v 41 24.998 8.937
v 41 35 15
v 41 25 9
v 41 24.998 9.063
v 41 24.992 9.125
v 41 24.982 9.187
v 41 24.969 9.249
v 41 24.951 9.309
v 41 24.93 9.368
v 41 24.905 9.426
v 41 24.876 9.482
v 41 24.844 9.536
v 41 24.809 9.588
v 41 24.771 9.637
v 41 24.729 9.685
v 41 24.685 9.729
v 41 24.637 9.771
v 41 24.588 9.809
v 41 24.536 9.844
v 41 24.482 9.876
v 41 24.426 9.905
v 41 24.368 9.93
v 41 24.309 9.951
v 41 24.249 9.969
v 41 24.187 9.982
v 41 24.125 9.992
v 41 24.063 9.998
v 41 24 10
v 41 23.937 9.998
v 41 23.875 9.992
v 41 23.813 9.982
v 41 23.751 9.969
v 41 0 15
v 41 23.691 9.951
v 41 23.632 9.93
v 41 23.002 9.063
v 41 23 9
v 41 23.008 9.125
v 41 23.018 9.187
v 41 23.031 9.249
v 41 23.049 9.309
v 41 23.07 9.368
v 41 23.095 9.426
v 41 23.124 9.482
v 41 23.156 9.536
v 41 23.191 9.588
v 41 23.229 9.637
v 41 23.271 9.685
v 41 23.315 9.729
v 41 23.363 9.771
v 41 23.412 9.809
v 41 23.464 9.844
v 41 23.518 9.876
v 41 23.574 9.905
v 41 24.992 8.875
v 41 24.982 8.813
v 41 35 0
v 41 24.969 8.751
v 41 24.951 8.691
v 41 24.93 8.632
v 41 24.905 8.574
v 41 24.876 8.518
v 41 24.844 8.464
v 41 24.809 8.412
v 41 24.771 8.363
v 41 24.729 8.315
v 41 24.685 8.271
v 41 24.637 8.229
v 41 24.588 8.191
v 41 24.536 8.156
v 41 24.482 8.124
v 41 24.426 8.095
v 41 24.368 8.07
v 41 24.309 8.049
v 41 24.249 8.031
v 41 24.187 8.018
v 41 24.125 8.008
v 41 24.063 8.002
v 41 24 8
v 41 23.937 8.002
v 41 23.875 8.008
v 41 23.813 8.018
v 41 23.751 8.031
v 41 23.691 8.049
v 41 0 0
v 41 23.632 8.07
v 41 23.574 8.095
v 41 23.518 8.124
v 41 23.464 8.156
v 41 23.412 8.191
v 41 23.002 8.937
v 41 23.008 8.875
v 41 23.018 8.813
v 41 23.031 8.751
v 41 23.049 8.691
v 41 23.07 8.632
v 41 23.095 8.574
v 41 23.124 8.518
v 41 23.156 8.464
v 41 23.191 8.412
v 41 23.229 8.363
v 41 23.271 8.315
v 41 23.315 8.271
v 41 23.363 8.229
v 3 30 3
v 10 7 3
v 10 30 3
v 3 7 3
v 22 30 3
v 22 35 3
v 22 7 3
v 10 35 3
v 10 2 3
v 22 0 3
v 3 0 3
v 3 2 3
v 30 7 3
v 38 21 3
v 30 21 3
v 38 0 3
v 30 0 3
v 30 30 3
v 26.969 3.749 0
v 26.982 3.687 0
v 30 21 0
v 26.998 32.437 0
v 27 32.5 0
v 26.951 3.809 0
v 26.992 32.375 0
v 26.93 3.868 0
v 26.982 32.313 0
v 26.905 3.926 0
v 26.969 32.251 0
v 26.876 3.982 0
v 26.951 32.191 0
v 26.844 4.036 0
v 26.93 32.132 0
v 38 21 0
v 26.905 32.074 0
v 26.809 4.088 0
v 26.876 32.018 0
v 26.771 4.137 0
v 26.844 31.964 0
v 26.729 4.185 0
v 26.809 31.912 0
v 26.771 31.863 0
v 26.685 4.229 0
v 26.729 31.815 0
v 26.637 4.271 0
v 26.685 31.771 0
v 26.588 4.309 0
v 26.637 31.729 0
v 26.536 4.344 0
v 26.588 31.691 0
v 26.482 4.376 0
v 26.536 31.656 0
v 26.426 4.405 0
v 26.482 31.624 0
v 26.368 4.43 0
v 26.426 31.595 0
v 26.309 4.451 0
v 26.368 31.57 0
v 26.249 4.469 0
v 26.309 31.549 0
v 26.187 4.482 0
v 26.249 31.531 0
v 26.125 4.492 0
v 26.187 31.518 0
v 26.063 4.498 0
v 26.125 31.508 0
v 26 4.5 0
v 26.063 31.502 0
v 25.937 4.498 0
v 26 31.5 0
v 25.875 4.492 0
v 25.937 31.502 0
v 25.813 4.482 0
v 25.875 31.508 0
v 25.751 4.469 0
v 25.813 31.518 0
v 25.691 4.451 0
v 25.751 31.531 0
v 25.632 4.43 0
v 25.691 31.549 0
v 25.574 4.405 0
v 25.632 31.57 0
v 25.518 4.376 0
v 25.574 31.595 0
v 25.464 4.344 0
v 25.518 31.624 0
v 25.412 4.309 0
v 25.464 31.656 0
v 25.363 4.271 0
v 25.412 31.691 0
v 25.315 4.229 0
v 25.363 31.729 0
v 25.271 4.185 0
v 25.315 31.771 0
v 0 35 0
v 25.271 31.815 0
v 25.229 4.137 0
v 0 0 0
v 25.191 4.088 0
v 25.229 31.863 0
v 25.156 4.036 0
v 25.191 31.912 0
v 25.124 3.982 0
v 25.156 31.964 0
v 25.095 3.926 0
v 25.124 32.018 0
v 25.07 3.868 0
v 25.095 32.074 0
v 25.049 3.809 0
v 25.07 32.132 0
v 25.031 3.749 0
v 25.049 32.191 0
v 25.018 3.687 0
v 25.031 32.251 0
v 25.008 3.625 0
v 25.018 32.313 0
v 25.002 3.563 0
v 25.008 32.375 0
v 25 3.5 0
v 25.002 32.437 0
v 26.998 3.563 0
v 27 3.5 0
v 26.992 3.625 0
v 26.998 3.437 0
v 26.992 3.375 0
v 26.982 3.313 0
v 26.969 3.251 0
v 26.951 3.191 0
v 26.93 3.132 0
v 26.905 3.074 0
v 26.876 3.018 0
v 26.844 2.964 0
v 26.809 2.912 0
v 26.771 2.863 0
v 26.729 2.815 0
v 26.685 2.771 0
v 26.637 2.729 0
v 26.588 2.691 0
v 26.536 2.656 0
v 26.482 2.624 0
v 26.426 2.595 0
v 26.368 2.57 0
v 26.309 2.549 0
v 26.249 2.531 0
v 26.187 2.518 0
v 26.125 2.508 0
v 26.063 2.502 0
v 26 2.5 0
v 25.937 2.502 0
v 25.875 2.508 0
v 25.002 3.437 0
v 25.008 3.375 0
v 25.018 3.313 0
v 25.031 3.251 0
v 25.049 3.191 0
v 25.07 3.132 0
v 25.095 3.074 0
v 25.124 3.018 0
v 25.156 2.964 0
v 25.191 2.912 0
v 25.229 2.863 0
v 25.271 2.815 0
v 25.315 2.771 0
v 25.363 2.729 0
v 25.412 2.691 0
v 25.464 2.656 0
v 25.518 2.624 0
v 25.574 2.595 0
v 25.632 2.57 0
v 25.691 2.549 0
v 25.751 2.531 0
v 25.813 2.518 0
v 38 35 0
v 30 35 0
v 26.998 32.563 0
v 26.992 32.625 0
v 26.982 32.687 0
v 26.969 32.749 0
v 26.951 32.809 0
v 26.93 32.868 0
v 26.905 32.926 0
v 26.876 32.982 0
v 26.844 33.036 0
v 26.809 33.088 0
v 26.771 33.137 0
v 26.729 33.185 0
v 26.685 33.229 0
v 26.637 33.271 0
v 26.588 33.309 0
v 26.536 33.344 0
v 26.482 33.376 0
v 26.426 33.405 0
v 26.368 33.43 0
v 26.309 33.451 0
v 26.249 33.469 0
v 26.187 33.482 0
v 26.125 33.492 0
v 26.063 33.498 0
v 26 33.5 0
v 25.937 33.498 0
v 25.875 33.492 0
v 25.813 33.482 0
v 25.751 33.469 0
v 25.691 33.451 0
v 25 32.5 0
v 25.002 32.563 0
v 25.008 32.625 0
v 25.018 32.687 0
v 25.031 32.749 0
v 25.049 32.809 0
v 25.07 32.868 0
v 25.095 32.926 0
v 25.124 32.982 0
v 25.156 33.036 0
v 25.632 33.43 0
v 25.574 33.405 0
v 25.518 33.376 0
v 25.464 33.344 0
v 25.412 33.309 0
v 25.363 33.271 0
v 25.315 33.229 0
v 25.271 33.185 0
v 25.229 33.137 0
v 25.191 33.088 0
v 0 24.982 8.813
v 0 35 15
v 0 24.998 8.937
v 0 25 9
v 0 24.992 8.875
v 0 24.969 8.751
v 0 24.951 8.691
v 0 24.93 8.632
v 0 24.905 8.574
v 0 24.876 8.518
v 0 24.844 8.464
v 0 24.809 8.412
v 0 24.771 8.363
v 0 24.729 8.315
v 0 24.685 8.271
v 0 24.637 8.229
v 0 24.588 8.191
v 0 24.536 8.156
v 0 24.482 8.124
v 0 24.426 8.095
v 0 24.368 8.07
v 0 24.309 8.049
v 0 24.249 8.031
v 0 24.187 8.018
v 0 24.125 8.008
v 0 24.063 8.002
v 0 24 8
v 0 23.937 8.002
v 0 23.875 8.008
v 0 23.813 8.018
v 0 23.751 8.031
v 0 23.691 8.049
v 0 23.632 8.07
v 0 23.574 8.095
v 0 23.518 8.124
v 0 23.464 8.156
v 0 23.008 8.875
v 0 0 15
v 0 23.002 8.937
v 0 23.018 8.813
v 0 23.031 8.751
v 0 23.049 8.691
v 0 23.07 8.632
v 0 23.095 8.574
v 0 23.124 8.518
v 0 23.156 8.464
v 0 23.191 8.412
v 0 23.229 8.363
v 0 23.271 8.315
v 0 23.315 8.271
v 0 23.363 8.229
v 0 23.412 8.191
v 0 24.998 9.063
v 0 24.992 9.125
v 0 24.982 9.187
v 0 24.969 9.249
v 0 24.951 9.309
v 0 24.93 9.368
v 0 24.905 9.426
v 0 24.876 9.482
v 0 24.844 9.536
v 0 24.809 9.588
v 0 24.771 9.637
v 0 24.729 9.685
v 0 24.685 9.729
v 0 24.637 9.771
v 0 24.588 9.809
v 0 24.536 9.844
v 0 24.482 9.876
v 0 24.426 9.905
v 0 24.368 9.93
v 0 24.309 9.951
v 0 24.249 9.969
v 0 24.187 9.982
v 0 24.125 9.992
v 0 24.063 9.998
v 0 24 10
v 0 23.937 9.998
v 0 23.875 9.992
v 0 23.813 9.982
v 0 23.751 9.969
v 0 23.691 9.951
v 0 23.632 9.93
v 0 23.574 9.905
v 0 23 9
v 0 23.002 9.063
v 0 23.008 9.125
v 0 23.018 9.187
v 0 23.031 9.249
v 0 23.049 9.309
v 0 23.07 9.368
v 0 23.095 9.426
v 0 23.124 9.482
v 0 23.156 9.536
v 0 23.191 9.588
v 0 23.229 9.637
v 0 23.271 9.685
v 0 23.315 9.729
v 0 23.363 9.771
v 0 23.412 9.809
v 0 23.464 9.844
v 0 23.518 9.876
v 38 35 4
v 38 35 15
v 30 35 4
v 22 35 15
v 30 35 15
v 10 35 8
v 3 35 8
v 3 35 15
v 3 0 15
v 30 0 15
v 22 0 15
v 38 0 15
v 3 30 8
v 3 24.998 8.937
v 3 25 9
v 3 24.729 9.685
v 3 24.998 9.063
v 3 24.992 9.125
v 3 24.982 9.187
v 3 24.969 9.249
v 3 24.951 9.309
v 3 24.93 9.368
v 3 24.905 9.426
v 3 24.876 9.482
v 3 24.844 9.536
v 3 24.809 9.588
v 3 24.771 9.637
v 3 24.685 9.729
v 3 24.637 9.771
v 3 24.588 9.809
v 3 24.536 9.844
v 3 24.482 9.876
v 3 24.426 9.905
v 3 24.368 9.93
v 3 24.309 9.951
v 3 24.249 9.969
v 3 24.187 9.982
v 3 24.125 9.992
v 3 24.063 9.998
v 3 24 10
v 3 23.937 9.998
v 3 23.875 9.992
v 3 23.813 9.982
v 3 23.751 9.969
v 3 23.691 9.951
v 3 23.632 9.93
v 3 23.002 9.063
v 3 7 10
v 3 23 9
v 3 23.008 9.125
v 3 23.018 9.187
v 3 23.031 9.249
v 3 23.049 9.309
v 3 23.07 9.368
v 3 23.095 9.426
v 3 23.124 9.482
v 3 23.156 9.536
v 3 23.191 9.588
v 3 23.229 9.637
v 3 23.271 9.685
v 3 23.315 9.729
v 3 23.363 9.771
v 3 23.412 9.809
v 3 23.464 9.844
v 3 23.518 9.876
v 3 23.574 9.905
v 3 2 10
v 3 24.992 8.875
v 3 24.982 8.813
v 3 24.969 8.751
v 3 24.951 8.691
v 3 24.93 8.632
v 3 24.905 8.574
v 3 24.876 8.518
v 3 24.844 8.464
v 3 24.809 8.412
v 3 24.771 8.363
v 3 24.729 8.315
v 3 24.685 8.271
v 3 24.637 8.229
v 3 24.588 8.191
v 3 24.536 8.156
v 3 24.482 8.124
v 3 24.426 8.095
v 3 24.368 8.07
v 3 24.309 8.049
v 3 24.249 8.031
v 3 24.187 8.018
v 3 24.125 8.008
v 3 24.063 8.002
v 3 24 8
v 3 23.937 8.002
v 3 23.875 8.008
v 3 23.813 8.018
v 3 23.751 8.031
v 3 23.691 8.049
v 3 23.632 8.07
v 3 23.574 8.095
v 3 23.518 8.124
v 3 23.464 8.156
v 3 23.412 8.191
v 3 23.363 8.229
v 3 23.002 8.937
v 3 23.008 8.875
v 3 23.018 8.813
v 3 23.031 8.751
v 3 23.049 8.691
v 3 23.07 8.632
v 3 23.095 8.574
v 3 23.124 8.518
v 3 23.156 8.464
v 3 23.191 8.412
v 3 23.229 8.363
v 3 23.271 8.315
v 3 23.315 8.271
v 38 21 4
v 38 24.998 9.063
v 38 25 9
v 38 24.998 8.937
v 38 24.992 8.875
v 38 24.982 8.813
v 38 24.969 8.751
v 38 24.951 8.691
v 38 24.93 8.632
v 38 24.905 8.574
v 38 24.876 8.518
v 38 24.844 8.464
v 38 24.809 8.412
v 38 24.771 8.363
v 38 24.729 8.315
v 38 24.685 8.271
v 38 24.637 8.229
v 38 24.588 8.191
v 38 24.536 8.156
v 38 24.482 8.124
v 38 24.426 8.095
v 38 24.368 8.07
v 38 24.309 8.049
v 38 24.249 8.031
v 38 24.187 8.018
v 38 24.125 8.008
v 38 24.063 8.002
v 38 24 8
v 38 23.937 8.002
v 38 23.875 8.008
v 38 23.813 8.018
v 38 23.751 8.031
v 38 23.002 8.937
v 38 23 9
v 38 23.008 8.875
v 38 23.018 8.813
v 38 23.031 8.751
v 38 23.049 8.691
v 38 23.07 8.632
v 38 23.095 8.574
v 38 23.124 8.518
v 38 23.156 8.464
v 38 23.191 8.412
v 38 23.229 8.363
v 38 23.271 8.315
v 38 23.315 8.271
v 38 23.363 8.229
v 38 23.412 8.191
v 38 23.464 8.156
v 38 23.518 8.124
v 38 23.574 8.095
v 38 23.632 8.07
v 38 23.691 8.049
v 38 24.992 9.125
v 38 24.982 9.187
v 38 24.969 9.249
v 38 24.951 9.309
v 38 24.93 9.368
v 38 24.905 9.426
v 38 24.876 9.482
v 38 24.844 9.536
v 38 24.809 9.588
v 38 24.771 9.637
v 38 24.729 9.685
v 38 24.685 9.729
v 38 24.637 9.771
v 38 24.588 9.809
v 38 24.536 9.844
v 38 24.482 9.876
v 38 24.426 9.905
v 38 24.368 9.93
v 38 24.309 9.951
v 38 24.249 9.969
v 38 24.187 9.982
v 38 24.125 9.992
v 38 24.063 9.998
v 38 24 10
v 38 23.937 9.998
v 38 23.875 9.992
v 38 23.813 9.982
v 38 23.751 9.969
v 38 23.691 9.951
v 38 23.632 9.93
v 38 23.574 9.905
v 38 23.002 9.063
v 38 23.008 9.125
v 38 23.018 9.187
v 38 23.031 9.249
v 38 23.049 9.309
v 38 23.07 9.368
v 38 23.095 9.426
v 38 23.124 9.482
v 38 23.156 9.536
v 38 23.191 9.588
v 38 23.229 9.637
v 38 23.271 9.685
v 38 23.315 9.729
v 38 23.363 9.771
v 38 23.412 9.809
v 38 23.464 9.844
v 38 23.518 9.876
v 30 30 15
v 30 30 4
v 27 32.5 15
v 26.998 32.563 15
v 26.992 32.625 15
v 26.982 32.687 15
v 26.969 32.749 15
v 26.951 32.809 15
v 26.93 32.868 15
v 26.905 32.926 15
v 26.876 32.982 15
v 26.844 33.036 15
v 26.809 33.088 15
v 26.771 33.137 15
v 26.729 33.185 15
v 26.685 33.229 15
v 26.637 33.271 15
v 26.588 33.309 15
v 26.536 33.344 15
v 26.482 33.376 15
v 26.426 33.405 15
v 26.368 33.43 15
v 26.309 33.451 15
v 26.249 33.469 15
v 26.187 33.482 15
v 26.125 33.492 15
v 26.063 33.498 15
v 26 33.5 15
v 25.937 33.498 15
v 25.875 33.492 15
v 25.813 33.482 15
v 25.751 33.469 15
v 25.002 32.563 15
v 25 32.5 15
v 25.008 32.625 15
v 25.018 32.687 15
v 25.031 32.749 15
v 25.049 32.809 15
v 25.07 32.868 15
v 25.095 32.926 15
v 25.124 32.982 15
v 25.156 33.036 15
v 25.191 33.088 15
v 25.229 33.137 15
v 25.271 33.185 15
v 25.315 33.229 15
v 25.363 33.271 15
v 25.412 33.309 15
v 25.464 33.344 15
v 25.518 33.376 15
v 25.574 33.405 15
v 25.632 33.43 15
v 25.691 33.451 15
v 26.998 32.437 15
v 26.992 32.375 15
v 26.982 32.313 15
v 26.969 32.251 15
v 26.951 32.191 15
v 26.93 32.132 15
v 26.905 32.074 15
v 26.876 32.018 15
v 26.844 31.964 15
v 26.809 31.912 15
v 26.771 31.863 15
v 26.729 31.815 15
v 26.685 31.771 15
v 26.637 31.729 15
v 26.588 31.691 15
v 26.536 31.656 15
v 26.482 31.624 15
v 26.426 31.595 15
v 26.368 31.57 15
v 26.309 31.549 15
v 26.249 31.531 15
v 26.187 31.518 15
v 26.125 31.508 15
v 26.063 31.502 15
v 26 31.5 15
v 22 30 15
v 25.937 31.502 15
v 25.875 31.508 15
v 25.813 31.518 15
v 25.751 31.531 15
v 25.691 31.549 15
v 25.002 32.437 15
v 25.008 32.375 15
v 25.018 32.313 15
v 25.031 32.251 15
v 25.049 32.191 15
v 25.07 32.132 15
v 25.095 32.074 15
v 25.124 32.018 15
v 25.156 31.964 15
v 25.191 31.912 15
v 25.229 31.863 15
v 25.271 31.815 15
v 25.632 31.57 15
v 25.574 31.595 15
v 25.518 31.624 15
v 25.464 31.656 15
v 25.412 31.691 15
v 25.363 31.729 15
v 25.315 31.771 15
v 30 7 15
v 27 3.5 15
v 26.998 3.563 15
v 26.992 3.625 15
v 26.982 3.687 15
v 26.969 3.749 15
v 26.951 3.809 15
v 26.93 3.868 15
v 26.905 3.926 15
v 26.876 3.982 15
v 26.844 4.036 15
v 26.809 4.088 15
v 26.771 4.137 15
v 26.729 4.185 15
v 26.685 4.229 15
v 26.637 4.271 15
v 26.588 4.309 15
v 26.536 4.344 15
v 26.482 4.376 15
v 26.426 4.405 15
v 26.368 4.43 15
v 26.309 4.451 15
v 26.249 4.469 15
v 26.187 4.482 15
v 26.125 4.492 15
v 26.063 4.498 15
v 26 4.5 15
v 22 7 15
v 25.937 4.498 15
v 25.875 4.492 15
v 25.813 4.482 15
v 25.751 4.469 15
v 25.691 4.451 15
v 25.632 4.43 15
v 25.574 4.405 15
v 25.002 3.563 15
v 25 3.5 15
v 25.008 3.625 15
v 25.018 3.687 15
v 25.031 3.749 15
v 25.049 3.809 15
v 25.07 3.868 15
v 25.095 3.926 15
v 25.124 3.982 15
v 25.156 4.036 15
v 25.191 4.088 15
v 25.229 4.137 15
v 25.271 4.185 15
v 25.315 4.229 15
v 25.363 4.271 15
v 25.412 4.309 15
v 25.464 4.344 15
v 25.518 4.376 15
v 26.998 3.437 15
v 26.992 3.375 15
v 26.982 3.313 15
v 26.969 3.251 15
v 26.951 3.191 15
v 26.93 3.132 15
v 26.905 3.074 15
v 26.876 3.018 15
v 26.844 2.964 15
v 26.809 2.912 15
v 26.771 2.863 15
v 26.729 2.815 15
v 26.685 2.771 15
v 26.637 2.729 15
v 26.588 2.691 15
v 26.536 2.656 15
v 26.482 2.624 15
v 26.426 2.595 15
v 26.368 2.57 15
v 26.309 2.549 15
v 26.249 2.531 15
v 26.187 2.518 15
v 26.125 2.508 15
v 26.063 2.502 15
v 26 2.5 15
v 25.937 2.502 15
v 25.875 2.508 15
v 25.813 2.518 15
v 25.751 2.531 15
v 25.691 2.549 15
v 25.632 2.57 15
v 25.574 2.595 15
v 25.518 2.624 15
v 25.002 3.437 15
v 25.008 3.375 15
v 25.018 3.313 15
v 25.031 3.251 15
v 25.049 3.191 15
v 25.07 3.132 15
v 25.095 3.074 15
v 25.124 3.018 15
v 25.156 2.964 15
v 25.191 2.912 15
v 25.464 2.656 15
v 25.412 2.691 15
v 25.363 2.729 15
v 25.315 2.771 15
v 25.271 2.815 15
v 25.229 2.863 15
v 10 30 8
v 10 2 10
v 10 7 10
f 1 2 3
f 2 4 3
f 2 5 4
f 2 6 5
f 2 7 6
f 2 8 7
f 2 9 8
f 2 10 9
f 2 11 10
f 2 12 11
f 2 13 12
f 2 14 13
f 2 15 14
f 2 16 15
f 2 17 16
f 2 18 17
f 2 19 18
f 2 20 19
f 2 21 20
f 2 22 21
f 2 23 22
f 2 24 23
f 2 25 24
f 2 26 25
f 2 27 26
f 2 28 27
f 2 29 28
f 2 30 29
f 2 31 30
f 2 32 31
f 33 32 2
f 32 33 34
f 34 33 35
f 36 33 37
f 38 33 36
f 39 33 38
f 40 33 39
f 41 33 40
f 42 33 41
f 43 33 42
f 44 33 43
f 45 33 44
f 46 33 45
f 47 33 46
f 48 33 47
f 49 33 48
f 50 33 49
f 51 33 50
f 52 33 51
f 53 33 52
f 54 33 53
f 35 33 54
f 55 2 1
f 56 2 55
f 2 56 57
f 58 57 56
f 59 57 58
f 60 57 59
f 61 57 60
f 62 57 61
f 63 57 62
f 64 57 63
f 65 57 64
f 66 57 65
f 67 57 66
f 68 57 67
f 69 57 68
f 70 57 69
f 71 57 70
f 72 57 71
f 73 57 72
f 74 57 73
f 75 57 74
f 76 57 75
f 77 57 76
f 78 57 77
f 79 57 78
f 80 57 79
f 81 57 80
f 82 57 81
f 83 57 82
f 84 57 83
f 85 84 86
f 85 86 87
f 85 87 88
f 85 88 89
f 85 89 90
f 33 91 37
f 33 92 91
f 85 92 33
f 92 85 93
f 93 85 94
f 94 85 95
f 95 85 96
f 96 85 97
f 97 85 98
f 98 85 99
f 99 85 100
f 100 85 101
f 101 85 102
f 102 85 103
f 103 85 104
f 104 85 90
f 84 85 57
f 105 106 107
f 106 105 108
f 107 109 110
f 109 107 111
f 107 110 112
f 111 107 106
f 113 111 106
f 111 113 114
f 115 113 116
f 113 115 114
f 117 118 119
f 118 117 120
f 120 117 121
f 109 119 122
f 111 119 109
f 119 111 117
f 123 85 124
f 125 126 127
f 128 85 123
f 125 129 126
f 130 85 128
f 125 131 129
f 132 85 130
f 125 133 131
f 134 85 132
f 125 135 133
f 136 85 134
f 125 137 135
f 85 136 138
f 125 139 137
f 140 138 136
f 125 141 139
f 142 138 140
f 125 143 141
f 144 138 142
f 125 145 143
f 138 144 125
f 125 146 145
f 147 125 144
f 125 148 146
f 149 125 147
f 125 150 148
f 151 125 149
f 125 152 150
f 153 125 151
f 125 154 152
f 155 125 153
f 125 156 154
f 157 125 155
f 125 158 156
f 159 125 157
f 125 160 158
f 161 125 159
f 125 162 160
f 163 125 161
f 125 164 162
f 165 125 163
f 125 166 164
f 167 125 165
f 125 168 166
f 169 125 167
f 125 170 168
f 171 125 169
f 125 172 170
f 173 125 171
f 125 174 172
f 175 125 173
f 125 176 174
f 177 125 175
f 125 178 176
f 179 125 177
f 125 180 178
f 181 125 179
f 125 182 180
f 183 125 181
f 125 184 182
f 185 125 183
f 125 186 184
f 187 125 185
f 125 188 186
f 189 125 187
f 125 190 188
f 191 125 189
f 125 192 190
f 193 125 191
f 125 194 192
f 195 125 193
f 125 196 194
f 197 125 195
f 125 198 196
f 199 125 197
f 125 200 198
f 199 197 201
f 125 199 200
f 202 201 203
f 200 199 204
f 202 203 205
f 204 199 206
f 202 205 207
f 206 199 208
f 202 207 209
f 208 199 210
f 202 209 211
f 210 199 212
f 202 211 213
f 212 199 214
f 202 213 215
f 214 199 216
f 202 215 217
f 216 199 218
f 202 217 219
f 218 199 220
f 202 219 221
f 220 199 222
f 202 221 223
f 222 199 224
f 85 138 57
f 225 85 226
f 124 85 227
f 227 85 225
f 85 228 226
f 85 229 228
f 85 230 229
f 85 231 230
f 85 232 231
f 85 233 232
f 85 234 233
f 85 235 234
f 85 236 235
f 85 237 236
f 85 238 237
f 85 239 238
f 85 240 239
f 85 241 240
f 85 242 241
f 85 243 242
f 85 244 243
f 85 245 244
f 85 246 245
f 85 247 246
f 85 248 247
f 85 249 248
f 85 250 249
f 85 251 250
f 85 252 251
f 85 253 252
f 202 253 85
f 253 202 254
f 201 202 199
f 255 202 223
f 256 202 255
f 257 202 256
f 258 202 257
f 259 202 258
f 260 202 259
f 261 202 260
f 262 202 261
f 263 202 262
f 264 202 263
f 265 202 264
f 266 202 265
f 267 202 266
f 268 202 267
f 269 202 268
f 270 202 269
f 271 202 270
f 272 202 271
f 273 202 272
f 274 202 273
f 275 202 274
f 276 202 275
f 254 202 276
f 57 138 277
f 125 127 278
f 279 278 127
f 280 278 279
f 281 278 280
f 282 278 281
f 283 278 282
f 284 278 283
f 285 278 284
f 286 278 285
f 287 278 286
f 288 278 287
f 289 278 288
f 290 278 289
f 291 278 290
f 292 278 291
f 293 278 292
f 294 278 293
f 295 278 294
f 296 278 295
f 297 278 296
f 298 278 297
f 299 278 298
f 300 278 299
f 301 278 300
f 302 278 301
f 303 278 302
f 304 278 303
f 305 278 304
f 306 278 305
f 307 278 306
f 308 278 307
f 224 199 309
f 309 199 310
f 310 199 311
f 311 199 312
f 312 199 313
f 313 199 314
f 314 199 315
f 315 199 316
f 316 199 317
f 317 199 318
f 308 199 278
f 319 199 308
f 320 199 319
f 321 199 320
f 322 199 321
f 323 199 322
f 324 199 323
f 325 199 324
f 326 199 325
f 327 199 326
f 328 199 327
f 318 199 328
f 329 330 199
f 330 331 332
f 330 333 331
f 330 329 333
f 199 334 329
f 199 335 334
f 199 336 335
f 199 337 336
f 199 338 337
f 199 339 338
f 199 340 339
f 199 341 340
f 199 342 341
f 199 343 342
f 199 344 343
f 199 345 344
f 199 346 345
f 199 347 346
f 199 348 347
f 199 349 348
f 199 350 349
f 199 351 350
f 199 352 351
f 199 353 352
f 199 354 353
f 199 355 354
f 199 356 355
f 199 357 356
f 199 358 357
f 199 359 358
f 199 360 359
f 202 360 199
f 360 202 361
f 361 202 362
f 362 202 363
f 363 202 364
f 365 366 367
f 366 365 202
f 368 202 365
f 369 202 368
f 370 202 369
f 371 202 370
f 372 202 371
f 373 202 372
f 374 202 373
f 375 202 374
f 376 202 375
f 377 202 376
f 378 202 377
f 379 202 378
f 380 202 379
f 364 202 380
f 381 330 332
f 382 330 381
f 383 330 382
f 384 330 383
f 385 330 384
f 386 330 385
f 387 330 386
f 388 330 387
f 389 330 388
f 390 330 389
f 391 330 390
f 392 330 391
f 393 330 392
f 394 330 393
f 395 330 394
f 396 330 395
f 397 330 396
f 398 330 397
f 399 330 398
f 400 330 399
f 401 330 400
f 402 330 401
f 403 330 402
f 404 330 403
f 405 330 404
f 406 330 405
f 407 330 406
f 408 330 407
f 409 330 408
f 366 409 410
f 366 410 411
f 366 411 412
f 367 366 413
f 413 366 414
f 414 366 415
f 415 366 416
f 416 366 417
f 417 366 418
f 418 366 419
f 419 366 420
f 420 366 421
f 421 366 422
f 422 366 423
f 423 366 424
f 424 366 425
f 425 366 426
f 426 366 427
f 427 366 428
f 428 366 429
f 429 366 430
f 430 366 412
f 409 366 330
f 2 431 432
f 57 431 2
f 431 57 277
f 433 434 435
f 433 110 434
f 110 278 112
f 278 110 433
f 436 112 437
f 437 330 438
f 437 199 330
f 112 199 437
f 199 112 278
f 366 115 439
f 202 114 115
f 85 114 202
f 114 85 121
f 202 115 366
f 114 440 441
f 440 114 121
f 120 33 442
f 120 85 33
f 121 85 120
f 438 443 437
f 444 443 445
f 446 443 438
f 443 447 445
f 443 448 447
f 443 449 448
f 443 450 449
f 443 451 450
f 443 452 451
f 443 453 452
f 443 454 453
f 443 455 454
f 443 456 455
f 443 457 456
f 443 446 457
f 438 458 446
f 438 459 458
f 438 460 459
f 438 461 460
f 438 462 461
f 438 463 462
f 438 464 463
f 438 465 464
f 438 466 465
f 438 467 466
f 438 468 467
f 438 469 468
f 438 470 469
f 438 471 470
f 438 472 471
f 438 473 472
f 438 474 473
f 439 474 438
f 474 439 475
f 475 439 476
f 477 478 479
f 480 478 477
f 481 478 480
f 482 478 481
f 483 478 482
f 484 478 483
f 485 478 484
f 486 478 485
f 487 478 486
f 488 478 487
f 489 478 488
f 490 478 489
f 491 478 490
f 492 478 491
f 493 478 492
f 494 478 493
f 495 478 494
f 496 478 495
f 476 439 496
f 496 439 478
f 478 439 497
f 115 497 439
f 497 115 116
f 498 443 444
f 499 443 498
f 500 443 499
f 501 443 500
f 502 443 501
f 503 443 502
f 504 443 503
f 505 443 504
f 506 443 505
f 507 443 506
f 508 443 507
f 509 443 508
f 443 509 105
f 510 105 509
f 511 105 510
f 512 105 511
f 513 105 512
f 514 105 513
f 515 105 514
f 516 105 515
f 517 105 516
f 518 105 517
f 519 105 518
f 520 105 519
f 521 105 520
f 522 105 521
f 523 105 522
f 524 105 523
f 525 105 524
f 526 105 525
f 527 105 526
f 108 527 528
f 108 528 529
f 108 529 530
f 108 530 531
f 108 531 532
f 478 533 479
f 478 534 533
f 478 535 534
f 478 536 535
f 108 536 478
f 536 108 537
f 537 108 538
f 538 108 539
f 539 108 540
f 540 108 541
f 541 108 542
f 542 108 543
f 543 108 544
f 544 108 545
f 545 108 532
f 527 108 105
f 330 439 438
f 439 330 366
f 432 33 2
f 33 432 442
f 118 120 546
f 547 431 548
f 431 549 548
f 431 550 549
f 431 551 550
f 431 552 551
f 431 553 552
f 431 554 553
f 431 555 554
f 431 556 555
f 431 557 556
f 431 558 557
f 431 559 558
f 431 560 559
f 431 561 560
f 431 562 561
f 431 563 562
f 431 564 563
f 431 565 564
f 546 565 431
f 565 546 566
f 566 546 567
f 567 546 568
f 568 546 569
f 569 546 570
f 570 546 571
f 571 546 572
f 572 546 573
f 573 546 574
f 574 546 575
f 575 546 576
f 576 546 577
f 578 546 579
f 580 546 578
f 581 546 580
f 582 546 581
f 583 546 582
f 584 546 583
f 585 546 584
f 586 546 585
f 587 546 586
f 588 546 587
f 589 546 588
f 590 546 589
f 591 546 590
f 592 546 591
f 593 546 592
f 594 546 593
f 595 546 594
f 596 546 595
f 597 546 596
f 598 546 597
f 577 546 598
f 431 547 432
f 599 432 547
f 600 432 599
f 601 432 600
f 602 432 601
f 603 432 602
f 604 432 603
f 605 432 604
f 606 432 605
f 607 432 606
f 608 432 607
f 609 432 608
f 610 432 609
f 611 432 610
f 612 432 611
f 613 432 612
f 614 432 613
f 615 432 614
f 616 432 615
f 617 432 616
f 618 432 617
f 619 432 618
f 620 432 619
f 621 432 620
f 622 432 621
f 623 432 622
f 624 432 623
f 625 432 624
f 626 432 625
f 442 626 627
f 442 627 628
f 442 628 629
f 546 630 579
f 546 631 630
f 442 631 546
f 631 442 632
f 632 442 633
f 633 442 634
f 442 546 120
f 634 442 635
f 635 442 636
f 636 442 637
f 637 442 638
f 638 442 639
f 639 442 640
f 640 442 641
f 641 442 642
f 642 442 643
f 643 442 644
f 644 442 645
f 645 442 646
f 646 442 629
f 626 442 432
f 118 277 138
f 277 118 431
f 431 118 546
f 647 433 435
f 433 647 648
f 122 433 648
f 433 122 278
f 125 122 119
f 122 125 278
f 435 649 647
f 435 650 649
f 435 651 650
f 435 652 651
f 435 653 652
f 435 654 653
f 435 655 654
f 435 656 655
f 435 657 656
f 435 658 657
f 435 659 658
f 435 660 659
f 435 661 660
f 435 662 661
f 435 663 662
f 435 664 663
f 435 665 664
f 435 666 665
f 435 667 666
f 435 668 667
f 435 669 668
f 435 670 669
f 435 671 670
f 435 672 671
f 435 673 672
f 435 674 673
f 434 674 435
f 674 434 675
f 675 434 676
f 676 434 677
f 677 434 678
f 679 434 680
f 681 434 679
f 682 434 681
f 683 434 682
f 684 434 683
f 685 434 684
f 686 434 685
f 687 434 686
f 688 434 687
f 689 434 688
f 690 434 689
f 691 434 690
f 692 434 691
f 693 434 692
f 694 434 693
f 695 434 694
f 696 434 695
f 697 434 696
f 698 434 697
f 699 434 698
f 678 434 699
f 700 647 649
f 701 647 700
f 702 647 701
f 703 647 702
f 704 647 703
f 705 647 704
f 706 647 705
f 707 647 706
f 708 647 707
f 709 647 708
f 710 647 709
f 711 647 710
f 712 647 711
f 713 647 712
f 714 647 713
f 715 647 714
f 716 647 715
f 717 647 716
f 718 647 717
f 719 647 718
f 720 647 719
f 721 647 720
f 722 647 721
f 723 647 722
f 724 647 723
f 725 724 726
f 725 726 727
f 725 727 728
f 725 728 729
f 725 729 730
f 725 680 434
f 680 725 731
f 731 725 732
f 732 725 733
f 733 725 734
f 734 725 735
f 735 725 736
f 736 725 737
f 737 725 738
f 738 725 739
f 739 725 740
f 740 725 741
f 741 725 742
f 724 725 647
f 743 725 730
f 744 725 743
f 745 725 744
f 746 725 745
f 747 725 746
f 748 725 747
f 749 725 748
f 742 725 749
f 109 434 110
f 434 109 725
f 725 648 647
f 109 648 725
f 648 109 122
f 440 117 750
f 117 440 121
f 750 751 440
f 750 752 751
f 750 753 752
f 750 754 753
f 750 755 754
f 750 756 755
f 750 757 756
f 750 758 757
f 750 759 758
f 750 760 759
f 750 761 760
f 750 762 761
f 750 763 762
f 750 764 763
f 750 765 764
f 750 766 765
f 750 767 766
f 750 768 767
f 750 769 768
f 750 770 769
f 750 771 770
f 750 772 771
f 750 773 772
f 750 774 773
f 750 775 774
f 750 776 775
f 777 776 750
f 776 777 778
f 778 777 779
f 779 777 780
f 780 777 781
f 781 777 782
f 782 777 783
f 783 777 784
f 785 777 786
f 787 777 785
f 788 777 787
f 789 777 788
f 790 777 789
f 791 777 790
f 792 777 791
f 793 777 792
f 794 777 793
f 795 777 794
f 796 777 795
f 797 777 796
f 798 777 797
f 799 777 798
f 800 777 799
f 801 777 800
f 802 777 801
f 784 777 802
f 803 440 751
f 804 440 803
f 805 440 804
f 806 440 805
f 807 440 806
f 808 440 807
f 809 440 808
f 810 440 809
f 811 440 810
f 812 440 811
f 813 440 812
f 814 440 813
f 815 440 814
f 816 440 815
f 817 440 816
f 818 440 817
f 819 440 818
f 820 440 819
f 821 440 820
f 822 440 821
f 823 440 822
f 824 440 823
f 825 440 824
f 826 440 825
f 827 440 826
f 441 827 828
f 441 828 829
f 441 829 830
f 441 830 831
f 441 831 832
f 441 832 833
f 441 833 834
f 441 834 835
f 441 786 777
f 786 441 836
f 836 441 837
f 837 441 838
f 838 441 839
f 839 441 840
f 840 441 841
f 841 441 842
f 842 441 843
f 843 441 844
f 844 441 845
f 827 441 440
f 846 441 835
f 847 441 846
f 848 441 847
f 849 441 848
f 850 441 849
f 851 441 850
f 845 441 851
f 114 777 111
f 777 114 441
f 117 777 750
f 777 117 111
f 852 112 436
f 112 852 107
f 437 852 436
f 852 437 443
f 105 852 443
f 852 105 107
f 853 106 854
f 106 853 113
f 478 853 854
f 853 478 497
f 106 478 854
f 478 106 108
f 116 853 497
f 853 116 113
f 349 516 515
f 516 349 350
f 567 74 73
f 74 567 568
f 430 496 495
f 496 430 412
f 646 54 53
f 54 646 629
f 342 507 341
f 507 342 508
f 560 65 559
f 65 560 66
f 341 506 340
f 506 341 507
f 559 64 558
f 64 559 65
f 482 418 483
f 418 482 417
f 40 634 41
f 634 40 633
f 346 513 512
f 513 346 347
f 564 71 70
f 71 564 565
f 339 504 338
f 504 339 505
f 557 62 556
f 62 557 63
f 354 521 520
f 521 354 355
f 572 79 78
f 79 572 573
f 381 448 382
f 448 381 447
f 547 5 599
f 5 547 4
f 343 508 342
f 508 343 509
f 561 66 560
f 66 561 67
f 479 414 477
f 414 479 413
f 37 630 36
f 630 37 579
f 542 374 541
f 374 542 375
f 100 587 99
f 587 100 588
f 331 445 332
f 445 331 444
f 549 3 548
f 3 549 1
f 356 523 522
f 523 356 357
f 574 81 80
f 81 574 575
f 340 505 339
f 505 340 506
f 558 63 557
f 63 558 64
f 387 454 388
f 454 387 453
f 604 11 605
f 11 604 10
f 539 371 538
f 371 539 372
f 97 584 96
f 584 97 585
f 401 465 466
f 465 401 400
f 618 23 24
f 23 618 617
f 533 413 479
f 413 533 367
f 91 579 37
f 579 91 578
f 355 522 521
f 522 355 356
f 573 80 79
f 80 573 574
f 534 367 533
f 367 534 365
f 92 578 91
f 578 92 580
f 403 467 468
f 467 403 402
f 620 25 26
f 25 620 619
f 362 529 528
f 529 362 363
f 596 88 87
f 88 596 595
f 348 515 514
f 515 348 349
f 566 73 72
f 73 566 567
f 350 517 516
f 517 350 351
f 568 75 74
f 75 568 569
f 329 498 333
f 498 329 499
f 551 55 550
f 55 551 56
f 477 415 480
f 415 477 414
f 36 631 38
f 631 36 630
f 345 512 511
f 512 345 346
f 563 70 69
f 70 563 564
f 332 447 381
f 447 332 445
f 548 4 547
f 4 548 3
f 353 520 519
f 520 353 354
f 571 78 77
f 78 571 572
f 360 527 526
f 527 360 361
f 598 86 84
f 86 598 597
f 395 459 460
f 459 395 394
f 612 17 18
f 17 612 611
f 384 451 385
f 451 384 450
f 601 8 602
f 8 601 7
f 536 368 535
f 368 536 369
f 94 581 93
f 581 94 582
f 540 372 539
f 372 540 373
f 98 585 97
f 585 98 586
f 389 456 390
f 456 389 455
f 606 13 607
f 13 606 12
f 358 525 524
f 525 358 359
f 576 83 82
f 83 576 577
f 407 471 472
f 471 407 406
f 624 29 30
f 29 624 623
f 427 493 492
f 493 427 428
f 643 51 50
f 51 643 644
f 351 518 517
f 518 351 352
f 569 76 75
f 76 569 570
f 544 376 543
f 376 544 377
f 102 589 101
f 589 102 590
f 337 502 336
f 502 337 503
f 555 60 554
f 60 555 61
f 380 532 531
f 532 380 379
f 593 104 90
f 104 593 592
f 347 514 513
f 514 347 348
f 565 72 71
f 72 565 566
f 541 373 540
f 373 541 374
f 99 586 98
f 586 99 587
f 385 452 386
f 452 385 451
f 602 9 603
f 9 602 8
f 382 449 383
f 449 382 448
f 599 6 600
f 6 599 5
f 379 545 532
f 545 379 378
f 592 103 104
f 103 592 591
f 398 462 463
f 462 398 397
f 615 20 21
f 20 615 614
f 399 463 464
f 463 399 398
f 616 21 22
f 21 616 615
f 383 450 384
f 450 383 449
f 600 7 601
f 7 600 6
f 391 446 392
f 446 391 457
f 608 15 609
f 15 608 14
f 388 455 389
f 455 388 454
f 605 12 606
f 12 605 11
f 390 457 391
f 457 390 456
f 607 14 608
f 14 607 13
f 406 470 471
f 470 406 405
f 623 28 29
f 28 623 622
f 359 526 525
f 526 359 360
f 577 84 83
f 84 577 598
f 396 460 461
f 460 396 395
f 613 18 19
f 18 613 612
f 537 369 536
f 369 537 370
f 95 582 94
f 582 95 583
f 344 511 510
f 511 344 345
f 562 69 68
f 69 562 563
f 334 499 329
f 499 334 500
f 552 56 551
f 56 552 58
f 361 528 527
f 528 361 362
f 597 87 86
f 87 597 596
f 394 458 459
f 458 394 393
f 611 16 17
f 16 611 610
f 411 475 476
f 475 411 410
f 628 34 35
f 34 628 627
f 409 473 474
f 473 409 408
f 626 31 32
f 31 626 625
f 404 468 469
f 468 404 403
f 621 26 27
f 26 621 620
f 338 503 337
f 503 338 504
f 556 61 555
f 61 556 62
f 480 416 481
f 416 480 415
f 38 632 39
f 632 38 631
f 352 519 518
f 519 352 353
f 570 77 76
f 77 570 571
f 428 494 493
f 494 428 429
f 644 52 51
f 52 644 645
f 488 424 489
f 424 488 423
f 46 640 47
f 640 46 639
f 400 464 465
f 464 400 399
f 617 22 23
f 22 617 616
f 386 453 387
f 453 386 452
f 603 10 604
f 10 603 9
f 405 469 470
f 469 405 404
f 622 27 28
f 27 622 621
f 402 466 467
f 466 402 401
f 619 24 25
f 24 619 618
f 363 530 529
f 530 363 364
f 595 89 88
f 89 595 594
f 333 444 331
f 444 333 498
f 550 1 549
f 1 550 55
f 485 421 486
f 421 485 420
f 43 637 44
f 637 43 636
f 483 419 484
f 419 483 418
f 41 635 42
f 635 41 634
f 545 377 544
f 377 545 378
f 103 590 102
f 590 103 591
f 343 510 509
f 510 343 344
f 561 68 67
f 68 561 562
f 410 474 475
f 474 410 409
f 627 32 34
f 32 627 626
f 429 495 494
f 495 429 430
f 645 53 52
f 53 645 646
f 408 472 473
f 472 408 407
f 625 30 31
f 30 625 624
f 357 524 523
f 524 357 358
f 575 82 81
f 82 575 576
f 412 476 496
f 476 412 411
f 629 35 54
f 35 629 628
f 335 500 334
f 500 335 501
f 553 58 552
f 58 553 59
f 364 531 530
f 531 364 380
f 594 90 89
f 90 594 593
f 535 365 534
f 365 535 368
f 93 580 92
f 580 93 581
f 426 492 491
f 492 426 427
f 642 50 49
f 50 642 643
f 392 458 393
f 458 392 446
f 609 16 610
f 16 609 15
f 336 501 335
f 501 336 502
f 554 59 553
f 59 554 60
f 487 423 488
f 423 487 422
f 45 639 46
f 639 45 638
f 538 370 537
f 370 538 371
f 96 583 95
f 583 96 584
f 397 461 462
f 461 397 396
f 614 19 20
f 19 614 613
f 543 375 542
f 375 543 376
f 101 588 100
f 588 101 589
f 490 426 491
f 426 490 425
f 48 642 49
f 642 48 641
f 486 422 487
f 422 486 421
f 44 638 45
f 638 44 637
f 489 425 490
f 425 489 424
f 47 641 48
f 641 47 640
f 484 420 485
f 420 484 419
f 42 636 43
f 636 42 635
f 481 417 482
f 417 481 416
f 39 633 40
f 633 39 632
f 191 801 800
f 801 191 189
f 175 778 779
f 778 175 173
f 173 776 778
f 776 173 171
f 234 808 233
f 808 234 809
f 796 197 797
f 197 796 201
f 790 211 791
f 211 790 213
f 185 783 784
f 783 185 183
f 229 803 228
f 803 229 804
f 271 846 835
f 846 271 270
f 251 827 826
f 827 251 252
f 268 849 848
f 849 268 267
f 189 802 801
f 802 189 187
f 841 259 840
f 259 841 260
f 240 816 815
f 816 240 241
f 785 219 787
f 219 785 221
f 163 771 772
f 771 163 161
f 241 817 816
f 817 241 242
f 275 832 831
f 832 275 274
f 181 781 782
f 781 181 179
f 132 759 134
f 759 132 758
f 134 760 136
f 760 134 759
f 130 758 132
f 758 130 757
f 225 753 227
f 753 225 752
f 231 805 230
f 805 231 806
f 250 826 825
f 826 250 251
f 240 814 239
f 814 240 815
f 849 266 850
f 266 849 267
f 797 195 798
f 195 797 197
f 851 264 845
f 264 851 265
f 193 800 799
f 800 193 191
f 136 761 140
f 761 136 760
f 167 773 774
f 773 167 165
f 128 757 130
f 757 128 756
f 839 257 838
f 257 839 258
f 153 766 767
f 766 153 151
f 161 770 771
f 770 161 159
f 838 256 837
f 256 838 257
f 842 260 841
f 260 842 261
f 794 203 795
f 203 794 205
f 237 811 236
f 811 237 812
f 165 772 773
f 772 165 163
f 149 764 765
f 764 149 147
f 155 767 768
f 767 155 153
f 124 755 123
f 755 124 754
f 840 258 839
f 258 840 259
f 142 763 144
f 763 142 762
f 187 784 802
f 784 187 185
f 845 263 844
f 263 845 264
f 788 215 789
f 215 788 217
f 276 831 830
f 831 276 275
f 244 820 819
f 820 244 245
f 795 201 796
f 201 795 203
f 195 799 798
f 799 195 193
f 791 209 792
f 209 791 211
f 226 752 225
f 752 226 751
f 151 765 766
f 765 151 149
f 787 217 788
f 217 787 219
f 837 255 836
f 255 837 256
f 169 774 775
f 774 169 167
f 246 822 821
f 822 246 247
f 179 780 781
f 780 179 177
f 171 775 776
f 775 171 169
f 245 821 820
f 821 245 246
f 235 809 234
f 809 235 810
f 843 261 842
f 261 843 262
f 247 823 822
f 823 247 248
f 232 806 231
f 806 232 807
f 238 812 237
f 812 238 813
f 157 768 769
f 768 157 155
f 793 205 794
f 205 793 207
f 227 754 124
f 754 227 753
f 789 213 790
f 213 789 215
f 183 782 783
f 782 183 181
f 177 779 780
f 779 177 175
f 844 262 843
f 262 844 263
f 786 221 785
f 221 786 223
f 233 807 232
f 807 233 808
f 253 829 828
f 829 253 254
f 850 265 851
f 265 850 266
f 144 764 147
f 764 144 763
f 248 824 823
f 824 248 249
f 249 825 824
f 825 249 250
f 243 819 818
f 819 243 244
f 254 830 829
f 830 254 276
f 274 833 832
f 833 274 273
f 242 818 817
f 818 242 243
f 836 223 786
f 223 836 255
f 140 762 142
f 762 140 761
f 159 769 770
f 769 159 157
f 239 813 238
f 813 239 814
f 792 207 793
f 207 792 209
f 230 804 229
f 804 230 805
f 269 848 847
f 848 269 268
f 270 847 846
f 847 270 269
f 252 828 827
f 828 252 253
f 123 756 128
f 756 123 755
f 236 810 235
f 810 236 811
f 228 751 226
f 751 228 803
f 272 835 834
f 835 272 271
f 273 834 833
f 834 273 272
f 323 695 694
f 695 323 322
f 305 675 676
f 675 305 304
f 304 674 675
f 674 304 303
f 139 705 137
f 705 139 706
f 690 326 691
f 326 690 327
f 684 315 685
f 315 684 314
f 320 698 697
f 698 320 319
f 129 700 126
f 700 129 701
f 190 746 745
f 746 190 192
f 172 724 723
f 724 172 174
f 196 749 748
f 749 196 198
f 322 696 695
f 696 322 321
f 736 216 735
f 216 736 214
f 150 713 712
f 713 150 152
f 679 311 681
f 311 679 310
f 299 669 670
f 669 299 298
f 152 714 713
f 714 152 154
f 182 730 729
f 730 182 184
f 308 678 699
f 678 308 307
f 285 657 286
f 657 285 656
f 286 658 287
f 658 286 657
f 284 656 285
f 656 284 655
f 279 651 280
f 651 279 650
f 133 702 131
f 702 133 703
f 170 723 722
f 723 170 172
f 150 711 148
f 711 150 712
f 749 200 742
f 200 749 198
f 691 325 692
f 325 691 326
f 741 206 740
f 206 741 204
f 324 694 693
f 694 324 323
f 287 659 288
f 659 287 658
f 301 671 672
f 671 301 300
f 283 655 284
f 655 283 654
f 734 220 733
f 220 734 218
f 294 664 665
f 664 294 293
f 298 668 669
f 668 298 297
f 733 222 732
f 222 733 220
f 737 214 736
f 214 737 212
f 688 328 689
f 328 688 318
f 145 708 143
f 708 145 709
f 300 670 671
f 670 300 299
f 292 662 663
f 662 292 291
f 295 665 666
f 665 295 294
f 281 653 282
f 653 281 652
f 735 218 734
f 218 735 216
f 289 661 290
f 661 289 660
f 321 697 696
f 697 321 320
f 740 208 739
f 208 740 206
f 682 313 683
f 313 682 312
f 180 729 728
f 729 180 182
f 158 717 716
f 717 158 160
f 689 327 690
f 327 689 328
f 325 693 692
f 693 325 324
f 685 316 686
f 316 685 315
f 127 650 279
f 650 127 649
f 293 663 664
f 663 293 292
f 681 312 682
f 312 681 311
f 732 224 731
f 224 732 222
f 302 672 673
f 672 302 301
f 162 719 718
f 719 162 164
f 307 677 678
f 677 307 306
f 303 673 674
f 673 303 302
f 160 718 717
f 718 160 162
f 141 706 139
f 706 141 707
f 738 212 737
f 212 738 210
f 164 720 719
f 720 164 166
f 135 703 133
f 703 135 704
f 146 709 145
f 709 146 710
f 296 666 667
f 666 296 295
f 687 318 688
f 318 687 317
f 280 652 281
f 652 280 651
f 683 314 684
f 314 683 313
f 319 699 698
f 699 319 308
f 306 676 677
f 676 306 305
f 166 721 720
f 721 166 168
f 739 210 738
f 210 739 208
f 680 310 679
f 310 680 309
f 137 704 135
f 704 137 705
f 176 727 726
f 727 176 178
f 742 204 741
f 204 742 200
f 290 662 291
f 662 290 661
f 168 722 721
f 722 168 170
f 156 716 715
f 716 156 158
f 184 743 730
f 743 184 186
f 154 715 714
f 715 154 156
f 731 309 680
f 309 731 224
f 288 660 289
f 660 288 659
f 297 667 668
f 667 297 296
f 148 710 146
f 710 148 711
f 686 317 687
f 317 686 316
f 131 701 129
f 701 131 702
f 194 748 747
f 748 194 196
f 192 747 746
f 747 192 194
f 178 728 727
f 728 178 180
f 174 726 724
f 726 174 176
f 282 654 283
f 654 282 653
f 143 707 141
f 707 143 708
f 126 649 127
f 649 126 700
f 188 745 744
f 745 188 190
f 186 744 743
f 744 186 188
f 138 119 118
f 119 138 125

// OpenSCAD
difference(){
	union(){
        
        translate([0,0,0]){
           cube([41,35,3], center=false);
        }
        translate([0,0,0]){
          cube([3,35,15], center=false);
        }      
        translate([38,0,0]){
          cube([3,35,15], center=false);
        }      
        
        translate([38-16,30,0]){
          cube([8,5,15], center=false);
        }      
        translate([22,0,0]){
          cube([8,7,15], center=false);
        }      

        translate([2,30,0]){
          cube([8,5,8], center=false);
        }      
        translate([2,2,0]){
          cube([8,5,10], center=false);
        }      

	}
	union() {
       translate([0,24,3+6]){
            rotate(a = [0,90,0]) {
                cylinder(h=600, r=1, $fn=100, center=true);
            }
       }			   
       translate([26,3.5,0]){
            rotate(a = [0,0,90]) {
                cylinder(h=600, r=1, $fn=100, center=true);
            }
       }			   
       translate([26,35-2.5,0]){
            rotate(a = [0,0,90]) {
                cylinder(h=600, r=1, $fn=100, center=true);
            }
       }	
       translate([30,21,-4]){
          cube([8,15,8], center=false);
        }      

        
	}
}
